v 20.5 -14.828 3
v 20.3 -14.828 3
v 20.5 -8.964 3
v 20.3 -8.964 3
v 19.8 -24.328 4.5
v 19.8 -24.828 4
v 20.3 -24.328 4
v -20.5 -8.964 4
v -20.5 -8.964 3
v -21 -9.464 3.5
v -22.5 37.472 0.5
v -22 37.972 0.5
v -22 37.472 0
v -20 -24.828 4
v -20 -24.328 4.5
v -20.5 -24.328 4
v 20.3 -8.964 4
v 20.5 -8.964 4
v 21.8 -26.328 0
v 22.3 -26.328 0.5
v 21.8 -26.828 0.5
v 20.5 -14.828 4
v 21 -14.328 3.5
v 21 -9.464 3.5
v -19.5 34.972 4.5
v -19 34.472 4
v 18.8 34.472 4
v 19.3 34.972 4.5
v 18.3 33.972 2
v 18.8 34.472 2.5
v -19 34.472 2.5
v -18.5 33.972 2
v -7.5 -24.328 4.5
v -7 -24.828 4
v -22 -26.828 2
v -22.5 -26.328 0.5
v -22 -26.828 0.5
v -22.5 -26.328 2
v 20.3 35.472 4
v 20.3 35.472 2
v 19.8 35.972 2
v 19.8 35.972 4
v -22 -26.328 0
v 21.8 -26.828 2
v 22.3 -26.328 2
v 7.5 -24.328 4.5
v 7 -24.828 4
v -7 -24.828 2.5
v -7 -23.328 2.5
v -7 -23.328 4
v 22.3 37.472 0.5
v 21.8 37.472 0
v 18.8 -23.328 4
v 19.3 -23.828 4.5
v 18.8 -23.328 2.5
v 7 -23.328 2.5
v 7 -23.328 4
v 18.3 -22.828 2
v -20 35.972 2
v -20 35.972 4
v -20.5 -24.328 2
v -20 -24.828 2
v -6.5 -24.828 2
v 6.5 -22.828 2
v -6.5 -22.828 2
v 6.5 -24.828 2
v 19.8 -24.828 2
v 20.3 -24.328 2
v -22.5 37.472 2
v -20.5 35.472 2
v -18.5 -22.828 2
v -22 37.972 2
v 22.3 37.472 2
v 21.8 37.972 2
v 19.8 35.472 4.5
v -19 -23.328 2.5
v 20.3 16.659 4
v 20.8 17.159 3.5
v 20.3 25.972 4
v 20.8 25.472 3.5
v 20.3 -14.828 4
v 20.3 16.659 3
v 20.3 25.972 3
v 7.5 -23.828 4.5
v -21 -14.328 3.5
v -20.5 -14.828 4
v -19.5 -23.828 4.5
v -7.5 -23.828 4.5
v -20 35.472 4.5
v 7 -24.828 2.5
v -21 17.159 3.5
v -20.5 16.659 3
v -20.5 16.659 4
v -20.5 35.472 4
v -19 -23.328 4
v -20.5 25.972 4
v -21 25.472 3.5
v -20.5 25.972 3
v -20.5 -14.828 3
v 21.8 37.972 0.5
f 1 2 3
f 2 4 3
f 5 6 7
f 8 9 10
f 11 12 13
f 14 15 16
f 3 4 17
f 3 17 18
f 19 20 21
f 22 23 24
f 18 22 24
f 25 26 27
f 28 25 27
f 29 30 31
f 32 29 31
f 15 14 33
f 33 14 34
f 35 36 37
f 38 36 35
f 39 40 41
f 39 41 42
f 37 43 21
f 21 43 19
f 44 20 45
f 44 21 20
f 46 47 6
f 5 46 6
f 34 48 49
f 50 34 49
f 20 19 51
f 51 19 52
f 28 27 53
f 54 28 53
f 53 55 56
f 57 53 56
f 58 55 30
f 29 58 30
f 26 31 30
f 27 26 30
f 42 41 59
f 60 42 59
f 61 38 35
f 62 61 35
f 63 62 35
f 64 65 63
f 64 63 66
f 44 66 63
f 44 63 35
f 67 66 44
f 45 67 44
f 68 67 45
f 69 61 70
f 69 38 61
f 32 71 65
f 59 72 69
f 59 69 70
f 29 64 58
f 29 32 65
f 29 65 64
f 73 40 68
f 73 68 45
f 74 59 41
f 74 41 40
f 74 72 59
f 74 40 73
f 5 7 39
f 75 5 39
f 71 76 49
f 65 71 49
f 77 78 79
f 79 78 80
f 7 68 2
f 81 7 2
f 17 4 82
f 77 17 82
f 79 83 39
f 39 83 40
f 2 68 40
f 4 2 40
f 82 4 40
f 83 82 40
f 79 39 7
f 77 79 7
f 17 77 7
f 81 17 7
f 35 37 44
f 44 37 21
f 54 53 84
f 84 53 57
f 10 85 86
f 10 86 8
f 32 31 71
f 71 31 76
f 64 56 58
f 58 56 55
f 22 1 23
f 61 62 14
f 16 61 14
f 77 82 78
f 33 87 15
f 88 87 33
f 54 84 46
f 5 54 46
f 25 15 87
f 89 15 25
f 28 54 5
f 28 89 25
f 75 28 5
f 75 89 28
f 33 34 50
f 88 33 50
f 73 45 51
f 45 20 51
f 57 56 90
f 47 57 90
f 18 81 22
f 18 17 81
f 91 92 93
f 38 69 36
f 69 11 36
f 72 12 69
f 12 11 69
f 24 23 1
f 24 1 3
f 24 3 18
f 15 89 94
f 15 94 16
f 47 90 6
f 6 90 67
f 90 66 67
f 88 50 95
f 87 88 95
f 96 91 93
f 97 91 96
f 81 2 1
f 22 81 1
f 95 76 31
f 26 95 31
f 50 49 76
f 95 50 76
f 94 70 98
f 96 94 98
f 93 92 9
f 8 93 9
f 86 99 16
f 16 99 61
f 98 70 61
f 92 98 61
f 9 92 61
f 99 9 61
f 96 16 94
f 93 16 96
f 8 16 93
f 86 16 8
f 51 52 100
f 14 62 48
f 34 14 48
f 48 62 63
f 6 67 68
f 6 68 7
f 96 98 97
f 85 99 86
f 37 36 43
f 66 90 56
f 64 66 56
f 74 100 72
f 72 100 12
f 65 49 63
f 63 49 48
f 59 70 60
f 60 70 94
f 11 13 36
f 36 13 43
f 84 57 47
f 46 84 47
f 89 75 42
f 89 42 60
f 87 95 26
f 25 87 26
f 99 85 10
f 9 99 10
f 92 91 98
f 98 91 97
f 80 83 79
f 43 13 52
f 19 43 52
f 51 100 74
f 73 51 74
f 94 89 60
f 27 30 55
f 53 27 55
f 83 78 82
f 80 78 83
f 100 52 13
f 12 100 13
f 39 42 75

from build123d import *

# Parameters (mm, degrees)
F0_W     = 1.5
F0_H     = 9.3130898729
F0_H_2   = 25.6233112887
F0_H_3   = 5.8635988384
F0_W_2   = 14
F0_H_4   = 2
F0_H_5   = 0.4158456028
F0_W_3   = 0.7
F0_W_4   = 0.5
F0_W_5   = 37.8
F0_H_6   = 8.5
F0_W_6   = 10
F0_H_7   = 1.5
F1_DEPTH = 2
F2_START = 1
F2_DEPTH = 3.5
F3_START = 3
F3_DEPTH = 1
F4_SIZE  = 0.49999


# Not quite as in the source:
# - a fillet or chamfer is up to 0.001 mm smaller than in the source, because OpenCascade refuses the exact size
# - a feature names something its author has since deleted; it is built from what else it names


with BuildPart() as f1:
    # F0 (on Top) → F1 (new body)
    with BuildSketch(Plane.XY):
        Polygon((-20.5, 25.9721875068), (-20.5, 35.9721875068), (20.3, 35.9721875068), (20.3, 25.9721875068), (20.8, 25.9721875068), (20.8, 16.6590976339), (20.3, 16.6590976339), (20.3, -8.9642136547), (21, -8.9642136547), (21, -14.8278124932), (20.3, -14.8278124932), (20.3, -24.8278124932), (17, -24.8278124932), (17, -26.8278124932), (22.3, -26.8278124932), (22.3, -13.9410611472), (22.3, 25.0854361609), (22.3, 37.9721875068), (-22.5, 37.9721875068), (-22.5, 25.0854361609), (-22.5, -13.9410611472), (-22.5, -26.8278124932), (-17, -26.8278124932), (-17, -24.8278124932), (-20.5, -24.8278124932), (-20.5, -14.8278124932), (-21, -14.8278124932), (-21, -8.9642136547), (-20.5, -8.9642136547), (-20.5, 16.6590976339), (-21, 16.6590976339), (-21, 25.9721875068), align=None)
        Polygon((20.3, 35.9721875068), (-20.5, 35.9721875068), (-20.5, 25.9721875068), (-19, 25.9721875068), (-19, 34.4721875068), (18.8, 34.4721875068), (18.8, 25.9721875068), (20.3, 25.9721875068), align=None)
        with Locations((-19.75, 21.3156425704)):
            Rectangle(F0_W, F0_H)
        with Locations((-19.75, 3.8474419896)):
            Rectangle(F0_W, F0_H_2)
        Polygon((18.8, -14.8278124932), (-19, -14.8278124932), (-19, -23.3278124932), (-7, -23.3278124932), (-7, -22.9119668904), (7, -22.9119668904), (7, -23.3278124932), (18.8, -23.3278124932), align=None)
        with Locations((-19.75, -11.8960130739)):
            Rectangle(F0_W, F0_H_3)
        with Locations((0, -25.8278124932)):
            Rectangle(F0_W_2, F0_H_4)
        with Locations((0, -23.1198896918)):
            Rectangle(F0_W_2, F0_H_5)
        Polygon((-19, -14.8278124932), (-20.5, -14.8278124932), (-20.5, -24.8278124932), (-17, -24.8278124932), (-7, -24.8278124932), (-7, -23.3278124932), (-19, -23.3278124932), align=None)
        with Locations((20.65, -11.8960130739)):
            Rectangle(F0_W_3, F0_H_3)
        with Locations((-20.75, -11.8960130739)):
            Rectangle(F0_W_4, F0_H_3)
        with Locations((-20.75, 21.3156425704)):
            Rectangle(F0_W_4, F0_H)
        with Locations((20.55, 21.3156425704)):
            Rectangle(F0_W_4, F0_H)
        with Locations((-0.1, 30.2221875068)):
            Rectangle(F0_W_5, F0_H_6)
        with Locations((-0.1, 21.3156425704)):
            Rectangle(F0_W_5, F0_H)
        with Locations((-0.1, 3.8474419896)):
            Rectangle(F0_W_5, F0_H_2)
        with Locations((-0.1, -11.8960130739)):
            Rectangle(F0_W_5, F0_H_3)
        with Locations((-12, -25.8278124932)):
            Rectangle(F0_W_6, F0_H_4)
        with Locations((0, -24.0778124932)):
            Rectangle(F0_W_2, F0_H_7)
        Polygon((20.3, -24.8278124932), (20.3, -14.8278124932), (18.8, -14.8278124932), (18.8, -23.3278124932), (7, -23.3278124932), (7, -24.8278124932), (17, -24.8278124932), align=None)
        with Locations((12, -25.8278124932)):
            Rectangle(F0_W_6, F0_H_4)
        with Locations((19.55, -11.8960130739)):
            Rectangle(F0_W, F0_H_3)
        with Locations((19.55, 3.8474419896)):
            Rectangle(F0_W, F0_H_2)
        with Locations((19.55, 21.3156425704)):
            Rectangle(F0_W, F0_H)
    extrude(amount=F1_DEPTH)

    # F0 (on Top) → F2 (join)
    with BuildSketch(Plane.XY.offset(F2_START)):
        Polygon((20.3, 35.9721875068), (-20.5, 35.9721875068), (-20.5, 25.9721875068), (-19, 25.9721875068), (-19, 34.4721875068), (18.8, 34.4721875068), (18.8, 25.9721875068), (20.3, 25.9721875068), align=None)
        with Locations((-19.75, 21.3156425704)):
            Rectangle(F0_W, F0_H)
        with Locations((-19.75, 3.8474419896)):
            Rectangle(F0_W, F0_H_2)
        with Locations((19.55, 21.3156425704)):
            Rectangle(F0_W, F0_H)
        with Locations((19.55, 3.8474419896)):
            Rectangle(F0_W, F0_H_2)
        Polygon((20.3, -24.8278124932), (20.3, -14.8278124932), (18.8, -14.8278124932), (18.8, -23.3278124932), (7, -23.3278124932), (7, -24.8278124932), (17, -24.8278124932), align=None)
        with Locations((19.55, -11.8960130739)):
            Rectangle(F0_W, F0_H_3)
        Polygon((-19, -14.8278124932), (-20.5, -14.8278124932), (-20.5, -24.8278124932), (-17, -24.8278124932), (-7, -24.8278124932), (-7, -23.3278124932), (-19, -23.3278124932), align=None)
        with Locations((-19.75, -11.8960130739)):
            Rectangle(F0_W, F0_H_3)
    extrude(amount=F2_DEPTH)

    # F0 (on Top) → F3 (join)
    with BuildSketch(Plane.XY.offset(F3_START)):
        with Locations((20.55, 21.3156425704)):
            Rectangle(F0_W_4, F0_H)
        with Locations((-20.75, 21.3156425704)):
            Rectangle(F0_W_4, F0_H)
        with Locations((-20.75, -11.8960130739)):
            Rectangle(F0_W_4, F0_H_3)
        with Locations((20.65, -11.8960130739)):
            Rectangle(F0_W_3, F0_H_3)
    extrude(amount=F3_DEPTH)

    # F4 (size 0.5 in the source; OpenCascade refuses exactly that, so slightly less here)
    f4_edges = [f1.edges().sort_by_distance(p)[0] for p in [
        (-21, 25.972188, 3.5),
        (-21, 16.659098, 3.5),
        (-21, 21.315643, 3),
        (-21, 21.315643, 4),
        (-21, -8.964214, 3.5),
        (-21, -14.827812, 3.5),
        (-21, -11.896013, 3),
        (-21, -11.896013, 4),
        (20.8, 16.659098, 3.5),
        (20.8, 25.972188, 3.5),
        (20.8, 21.315643, 3),
        (20.8, 21.315643, 4),
        (21, -14.827812, 3.5),
        (21, -8.964214, 3.5),
        (21, -11.896013, 3),
        (21, -11.896013, 4),
        (20.3, -24.827812, 3.25),
        (20.3, 35.972188, 3.25),
        (-0.1, 35.972188, 4.5),
        (-20.5, 5.572188, 4.5),
        (-13.75, -24.827812, 4.5),
        (-7, -24.077812, 4.5),
        (-13, -23.327812, 4.5),
        (-19, 5.572188, 4.5),
        (-0.1, 34.472188, 4.5),
        (18.8, 5.572188, 4.5),
        (12.9, -23.327812, 4.5),
        (7, -24.077812, 4.5),
        (13.65, -24.827812, 4.5),
        (20.3, 5.572188, 4.5),
        (-20.5, 35.972188, 3.25),
        (-22.5, 37.972188, 1),
        (-20.5, -24.827812, 3.25),
        (-22.5, -26.827812, 1),
        (22.3, -26.827812, 1),
        (22.3, 5.572188, 0),
        (-0.1, 37.972188, 0),
        (-22.5, 5.572188, 0),
        (-0.1, -26.827812, 0),
        (12.9, -23.327812, 2),
        (18.8, 5.572188, 2),
        (-13, -23.327812, 2),
        (-19, 5.572188, 2),
        (-0.1, 34.472188, 2),
        (7, -24.077812, 2),
        (-7, -24.077812, 2),
        (22.3, 37.972188, 1),
    ]]
    chamfer(f4_edges, length=F4_SIZE)


solid = f1.part
